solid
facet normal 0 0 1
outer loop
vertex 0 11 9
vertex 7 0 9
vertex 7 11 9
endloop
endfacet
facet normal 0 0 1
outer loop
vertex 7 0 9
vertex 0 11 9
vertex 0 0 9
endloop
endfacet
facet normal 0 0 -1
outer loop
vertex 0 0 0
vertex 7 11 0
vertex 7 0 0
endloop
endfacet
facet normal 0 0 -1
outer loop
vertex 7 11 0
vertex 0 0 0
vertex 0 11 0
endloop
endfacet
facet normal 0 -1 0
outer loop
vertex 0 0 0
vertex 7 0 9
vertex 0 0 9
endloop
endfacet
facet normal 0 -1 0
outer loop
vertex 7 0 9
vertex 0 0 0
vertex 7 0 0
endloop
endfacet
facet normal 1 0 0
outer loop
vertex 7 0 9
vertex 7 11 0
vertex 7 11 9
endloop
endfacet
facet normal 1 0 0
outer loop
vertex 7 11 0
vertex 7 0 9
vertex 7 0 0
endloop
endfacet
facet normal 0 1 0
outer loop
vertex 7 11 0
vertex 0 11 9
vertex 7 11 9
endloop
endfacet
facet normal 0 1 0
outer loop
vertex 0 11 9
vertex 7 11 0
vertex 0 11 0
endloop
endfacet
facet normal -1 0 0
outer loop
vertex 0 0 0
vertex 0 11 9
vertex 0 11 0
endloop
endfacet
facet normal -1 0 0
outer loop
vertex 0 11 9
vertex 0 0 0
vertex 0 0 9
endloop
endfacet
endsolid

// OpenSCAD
// Generated by SolidPython 1.0.1 on 2020-07-29 00:46:55


cube(size = [7, 11, 9]);
/***********************************************
*********      SolidPython code:      **********
************************************************
 
# import packages: SolidPython
from solid import *
from solid.utils import *
from itertools import chain, combinations, permutations


class Resize:

    def __init__(self, scad_file):
        self.scad_file = scad_file
        #self.scad_file = import_scad(scad_file)
        # cone/cylinder param:
        self.r1 = 0
        self.r2 = 0
        self.h = 0
        # rectangular prism param:
        self.w = 0
        self.l = 0
        # ellipse param:
        self.r = 0

    # import OpenScad code (file name corresponds to shape)


    # classify shape + parameters
    def assign(self, param1, param2, param3):
        if self.scad_file == 'cone.scad':
            self.r1 = param1
            self.r2 = param2
            self.h = param3
        elif self.scad_file == 'cylinder.scad':
            self.r1 = param1
            self.r2 = param2
            self.h = param3
        elif self.scad_file == 'rectangularPrism.scad':
            self.h = param1
            self.l = param2
            self.w = param3
        else:
            self.r = param1
            self.h = param2

    # resize parameters
    def iterate(self):
        x = range(3, 20, 2)
        i = 1
        if self.scad_file == 'cone.scad':
            tempList = list(permutations(x, 2))
            for temp in tempList:
                param1 = temp[0]
                param2 = temp[1]
                filepath = 'produced_scad_files/' + 'cone' + str(param1) + '_' + str(param2) + '_' + '.scad'
                scad_render_to_file(cylinder(h=param1, r1=param2, r2=0), filepath)

        elif self.scad_file == 'cylinder.scad':
            tempList = list(permutations(x, 3))
            for temp in tempList:
                param1 = temp[0]
                param2 = temp[1]
                filepath = 'produced_scad_files/' + 'cylinder' + str(param1) + '_' + str(param2) + '_' + '.scad'
                scad_render_to_file(cylinder(h=param1, r1=param2, r2=param2), filepath)

        elif self.scad_file == 'rectangularPrism.scad':
            tempList = list(permutations(x, 3))
            for temp in tempList:
                param1 = temp[0]
                param2 = temp[1]
                param3 = temp[2]
                filepath = 'produced_scad_files/' + 'rectangularPrism' + str(param1) + '_' + str(param2) + '_' + str(
                    param3) + '.scad'
                scad_render_to_file(cube(size=(param1, param2, param3)), filepath)

        elif self.scad_file == 'ellipse.scad':
            tempList = list(permutations(x, 4))
            for temp in tempList:
                param1 = temp[0]
                param2 = temp[1]
                param3 = temp[2]
                param4 = temp[3]
                filepath = 'produced_scad_files/' + 'ellipse' + str(param1) + '_' + str(param2) + '_' + str(param3) + '_' + str(param4) + '.scad'
                scad_render_to_file(scale([param1, param2, param3])(sphere(r=param4)), filepath)

    def render_to_scadfile(self):
        scad_render_to_file(scad, 'example.scad') 
 
************************************************/
